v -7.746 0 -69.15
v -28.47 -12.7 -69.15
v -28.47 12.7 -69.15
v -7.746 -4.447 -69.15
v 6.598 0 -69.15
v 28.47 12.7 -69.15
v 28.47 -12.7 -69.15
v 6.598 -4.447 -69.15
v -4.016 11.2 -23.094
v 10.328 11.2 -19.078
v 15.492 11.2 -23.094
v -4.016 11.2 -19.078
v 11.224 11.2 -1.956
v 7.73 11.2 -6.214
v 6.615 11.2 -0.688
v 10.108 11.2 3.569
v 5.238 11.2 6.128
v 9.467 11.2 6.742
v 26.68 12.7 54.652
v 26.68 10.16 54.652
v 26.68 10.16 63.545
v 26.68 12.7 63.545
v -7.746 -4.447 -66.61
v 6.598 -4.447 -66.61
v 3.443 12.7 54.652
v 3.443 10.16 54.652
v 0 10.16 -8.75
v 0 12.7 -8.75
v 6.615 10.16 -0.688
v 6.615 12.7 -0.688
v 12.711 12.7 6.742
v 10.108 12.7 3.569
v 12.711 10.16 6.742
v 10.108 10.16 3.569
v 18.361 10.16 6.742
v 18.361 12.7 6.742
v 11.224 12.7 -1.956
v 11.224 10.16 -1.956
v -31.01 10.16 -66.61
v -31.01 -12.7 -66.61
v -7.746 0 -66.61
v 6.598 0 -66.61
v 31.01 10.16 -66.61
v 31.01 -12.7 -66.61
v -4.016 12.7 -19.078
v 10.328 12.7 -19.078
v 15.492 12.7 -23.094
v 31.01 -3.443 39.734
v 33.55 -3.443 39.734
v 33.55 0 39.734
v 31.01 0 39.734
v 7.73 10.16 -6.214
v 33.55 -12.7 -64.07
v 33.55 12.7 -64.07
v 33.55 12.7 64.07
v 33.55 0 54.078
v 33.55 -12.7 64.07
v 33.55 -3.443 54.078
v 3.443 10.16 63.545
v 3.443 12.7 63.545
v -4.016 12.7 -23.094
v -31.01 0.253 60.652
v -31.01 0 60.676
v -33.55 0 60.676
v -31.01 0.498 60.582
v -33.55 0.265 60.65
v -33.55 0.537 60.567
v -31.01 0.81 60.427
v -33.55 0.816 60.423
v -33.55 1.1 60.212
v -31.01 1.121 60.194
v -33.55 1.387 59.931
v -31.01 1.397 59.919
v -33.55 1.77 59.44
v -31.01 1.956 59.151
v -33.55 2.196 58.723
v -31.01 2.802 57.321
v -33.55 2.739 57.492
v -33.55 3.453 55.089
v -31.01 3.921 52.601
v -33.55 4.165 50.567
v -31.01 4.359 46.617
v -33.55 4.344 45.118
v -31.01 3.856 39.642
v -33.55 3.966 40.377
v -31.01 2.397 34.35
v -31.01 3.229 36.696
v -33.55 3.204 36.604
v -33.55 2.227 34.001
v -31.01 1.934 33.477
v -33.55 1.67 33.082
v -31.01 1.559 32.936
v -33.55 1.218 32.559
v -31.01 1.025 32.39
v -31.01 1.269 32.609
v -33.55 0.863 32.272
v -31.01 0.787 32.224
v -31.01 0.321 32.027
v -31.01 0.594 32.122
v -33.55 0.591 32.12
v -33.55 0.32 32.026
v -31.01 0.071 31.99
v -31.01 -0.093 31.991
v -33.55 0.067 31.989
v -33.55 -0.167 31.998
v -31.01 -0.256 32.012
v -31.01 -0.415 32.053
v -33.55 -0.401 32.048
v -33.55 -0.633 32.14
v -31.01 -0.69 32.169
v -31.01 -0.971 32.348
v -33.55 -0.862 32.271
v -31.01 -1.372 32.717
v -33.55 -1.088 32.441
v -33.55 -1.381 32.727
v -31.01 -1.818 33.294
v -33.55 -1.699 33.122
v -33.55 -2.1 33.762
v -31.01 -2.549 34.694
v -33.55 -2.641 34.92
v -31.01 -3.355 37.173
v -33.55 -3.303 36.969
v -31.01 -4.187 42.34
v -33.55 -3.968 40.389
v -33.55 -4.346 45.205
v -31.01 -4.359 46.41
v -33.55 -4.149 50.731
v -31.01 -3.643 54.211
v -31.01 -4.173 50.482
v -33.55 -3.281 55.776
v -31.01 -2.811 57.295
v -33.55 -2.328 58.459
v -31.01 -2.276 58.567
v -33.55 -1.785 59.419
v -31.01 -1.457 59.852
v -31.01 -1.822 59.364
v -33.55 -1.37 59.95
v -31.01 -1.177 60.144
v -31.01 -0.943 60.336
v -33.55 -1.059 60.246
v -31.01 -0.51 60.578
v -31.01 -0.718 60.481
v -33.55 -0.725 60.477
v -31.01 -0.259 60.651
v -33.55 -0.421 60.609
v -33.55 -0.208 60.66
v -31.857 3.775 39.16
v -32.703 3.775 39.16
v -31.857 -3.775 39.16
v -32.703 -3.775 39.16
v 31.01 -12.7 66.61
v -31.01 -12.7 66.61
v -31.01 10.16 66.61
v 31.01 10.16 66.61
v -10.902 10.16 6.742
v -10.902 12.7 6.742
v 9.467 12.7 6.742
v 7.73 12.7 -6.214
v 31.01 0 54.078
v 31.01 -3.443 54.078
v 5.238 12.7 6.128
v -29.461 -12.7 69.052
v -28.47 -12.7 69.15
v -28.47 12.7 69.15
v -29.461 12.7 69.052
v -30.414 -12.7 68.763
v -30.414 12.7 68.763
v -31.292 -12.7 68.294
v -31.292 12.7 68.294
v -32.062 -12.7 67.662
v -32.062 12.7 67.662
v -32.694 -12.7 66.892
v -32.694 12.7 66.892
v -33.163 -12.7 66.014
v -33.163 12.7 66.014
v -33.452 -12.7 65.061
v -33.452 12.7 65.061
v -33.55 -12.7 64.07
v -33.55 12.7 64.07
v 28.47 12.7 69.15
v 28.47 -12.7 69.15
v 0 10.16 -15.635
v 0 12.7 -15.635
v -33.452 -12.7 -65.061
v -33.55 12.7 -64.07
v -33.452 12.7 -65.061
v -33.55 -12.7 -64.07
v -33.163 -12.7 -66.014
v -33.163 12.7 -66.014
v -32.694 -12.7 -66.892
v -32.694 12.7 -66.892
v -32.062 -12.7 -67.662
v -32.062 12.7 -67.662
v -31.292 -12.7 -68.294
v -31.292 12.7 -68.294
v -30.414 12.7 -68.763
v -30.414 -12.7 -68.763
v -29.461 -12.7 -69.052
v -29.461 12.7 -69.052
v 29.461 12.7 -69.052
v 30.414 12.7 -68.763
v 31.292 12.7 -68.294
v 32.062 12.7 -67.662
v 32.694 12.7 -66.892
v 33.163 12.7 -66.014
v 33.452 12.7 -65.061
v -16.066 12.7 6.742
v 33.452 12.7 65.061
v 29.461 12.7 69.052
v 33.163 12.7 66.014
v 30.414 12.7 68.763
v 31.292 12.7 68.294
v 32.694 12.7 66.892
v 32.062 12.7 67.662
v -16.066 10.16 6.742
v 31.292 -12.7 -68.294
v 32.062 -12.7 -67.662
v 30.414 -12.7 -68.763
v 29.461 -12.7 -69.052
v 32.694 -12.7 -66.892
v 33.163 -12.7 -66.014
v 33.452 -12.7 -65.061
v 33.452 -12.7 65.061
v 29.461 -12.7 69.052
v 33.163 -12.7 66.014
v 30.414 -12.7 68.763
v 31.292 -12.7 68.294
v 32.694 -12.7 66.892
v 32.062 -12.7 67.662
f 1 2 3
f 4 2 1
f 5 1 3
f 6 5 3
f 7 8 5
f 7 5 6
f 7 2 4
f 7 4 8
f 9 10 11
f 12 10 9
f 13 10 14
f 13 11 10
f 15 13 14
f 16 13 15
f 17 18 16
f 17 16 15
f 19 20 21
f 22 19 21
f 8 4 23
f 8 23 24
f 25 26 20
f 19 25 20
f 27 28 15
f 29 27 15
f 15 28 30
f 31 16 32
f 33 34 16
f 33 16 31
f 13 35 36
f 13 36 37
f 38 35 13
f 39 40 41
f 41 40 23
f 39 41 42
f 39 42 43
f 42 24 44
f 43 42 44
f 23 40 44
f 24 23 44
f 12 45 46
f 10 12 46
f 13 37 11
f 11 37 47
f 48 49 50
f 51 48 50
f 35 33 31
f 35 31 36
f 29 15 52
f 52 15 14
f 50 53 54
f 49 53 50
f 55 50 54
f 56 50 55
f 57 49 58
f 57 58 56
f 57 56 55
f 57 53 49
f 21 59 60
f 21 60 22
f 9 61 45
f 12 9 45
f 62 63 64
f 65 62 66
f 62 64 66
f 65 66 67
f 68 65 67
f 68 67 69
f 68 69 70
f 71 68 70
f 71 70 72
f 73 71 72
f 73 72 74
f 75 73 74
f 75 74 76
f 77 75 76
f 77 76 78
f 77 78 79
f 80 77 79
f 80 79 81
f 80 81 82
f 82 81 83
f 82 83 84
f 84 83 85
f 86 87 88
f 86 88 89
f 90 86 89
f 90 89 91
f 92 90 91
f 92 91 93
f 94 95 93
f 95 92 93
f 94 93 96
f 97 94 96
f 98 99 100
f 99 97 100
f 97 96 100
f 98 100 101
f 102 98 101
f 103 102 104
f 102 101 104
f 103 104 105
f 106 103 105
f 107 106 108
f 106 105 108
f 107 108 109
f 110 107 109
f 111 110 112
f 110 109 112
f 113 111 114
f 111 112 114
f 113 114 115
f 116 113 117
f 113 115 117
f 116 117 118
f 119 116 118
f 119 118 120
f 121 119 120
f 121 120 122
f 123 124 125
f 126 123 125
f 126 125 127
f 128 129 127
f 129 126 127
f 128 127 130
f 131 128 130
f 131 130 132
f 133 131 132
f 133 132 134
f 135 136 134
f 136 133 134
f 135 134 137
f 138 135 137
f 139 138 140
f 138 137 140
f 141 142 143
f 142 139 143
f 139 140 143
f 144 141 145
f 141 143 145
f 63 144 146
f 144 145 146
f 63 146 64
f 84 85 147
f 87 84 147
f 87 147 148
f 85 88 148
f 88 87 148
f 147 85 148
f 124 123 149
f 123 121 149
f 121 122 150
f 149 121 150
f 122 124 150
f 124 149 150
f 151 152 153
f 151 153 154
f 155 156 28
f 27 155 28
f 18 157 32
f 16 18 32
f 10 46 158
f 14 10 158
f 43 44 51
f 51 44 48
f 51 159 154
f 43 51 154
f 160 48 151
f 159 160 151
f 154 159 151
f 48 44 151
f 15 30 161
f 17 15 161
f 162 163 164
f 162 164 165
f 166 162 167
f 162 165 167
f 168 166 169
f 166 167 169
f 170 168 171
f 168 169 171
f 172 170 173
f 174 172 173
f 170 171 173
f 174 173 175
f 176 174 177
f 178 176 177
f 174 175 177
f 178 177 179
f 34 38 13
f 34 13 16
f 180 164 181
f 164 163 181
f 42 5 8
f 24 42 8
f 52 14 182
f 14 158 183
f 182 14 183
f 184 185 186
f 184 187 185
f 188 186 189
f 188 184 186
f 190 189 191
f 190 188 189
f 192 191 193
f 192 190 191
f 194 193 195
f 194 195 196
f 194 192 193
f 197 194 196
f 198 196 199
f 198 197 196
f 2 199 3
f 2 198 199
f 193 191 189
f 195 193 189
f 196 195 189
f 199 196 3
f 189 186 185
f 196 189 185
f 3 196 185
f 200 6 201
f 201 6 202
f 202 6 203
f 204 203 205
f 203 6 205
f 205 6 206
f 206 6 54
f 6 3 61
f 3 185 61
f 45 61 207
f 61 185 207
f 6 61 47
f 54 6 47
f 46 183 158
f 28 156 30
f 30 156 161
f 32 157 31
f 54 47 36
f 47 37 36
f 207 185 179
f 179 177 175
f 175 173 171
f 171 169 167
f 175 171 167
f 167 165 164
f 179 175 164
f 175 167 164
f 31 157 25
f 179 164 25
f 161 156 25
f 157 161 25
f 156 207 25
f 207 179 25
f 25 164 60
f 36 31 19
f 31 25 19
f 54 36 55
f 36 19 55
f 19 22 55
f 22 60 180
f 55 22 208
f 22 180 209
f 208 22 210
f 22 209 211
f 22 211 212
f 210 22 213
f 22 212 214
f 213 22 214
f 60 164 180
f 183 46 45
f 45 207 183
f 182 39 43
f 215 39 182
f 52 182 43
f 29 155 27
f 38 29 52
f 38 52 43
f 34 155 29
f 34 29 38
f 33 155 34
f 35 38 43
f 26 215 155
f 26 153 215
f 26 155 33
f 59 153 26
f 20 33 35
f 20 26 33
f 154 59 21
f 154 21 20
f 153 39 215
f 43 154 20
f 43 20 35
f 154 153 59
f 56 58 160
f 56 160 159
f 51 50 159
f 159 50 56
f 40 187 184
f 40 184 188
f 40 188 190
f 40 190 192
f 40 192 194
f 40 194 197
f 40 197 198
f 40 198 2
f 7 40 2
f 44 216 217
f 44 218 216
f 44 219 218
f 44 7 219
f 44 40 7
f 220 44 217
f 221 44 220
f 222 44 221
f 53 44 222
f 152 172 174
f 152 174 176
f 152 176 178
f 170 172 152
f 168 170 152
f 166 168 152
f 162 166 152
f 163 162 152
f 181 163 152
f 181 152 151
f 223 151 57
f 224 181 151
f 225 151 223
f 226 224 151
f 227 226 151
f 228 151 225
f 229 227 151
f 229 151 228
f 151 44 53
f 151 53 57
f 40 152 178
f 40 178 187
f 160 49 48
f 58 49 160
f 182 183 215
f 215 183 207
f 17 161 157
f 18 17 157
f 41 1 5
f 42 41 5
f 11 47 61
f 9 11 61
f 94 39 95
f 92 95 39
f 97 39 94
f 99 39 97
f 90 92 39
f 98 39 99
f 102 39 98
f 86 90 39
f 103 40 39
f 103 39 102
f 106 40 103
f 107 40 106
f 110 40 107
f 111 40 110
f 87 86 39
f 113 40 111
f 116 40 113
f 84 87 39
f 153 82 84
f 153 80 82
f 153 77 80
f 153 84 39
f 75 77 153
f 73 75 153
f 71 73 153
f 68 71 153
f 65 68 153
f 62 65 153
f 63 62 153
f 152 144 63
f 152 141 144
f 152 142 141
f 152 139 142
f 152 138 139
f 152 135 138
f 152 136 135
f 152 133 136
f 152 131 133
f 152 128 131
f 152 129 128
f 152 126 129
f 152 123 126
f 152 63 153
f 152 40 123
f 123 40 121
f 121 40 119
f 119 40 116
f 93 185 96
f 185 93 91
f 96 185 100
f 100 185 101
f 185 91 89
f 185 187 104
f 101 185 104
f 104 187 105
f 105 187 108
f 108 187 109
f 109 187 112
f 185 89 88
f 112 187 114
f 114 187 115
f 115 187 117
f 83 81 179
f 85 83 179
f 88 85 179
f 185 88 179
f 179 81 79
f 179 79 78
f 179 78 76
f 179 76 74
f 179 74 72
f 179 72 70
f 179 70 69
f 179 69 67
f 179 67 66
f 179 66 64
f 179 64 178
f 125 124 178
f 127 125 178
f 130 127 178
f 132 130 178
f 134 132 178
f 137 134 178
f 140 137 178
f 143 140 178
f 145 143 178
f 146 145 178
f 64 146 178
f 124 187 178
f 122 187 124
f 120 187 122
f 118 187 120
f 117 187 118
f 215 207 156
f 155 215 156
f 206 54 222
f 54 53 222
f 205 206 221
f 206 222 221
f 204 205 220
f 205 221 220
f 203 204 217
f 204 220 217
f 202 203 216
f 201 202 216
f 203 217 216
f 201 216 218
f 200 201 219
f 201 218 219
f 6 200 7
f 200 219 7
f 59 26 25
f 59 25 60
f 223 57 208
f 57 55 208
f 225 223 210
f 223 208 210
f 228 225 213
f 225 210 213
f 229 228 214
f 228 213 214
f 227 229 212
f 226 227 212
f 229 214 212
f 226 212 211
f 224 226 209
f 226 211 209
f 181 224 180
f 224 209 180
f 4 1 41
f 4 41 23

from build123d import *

# Parameters (mm, degrees)
F0_W      = 67.1
F0_H      = 138.3
F1_DEPTH  = 12.7
F2_T      = -2.54
F3_R      = 5.08
F4_W      = 23.2377038337
F4_H      = 8.8934414089
F5_DEPTH  = 12.5
F6_W      = 14.3442638218
F6_H      = 4.4467216358
F7_DEPTH  = 35
F9_DEPTH  = 27.5
F10_W     = 3.4426231869
F10_H     = 14.3442638218
F11_DEPTH = 27.5
F13_DEPTH = 1.5
F15_DEPTH = 27.5


with BuildPart() as f1:
    # F0 (on Front) → F1 (new body, symmetric)
    with BuildSketch(Plane.XZ):
        Rectangle(F0_W, F0_H)
    extrude(amount=F1_DEPTH, both=True)

    # F2
    f2_openings = [f1.faces().sort_by_distance(p)[0] for p in [
        (0, -12.7, 0),
    ]]
    offset(amount=F2_T, openings=f2_openings)

    # F3
    f3_edges = [f1.edges().sort_by_distance(p)[0] for p in [
        (33.55, 0, 69.15),
        (33.55, 0, -69.15),
        (-33.55, 0, 69.15),
        (-33.55, 0, -69.15),
    ]]
    fillet(f3_edges, radius=F3_R)

    # F4 (on face) → F5 (cut, symmetric)
    with BuildSketch(Plane.XZ.offset(-10.16)):
        with Locations((15.061476035, 59.0983647853)):
            Rectangle(F4_W, F4_H)
    extrude(amount=F5_DEPTH, both=True, mode=Mode.SUBTRACT)

    # F6 (on face) → F7 (cut, symmetric)
    with BuildSketch(Plane(origin=(0, 0, -69.15), x_dir=(1, 0, 0), z_dir=(0, 0, -1))):
        with Locations((-0.5737706088, 2.2233608179)):
            Rectangle(F6_W, F6_H)
    extrude(amount=F7_DEPTH, both=True, mode=Mode.SUBTRACT)

    # F8 (on face) → F9 (cut, symmetric)
    with BuildSketch(Plane(origin=(-33.55, 0, 0), x_dir=(0, -1, 0), z_dir=(-1, 0, 0))):
        with BuildLine():
            add(Edge.make_bspline(
                [(0, 60.676228255), (-7.550774062, 60.676228255), (-3.775387031, 39.1598381102), (0, 17.6434479654), (3.775387031, 39.1598381102), (7.550774062, 60.676228255), (0, 60.676228255)],
                knots=[0, 0, 0, 2.0943951024, 2.0943951024, 4.1887902048, 4.1887902048, 6.2831853072, 6.2831853072, 6.2831853072], degree=2, weights=[1, 0.5, 1, 0.5, 1, 0.5, 1]))
        make_face()
    extrude(amount=F9_DEPTH, both=True, mode=Mode.SUBTRACT)

    # F10 (on face) → F11 (cut, symmetric)
    with BuildSketch(Plane.YZ.offset(33.55)):
        with Locations((-1.7213115934, 46.9057392329)):
            Rectangle(F10_W, F10_H)
    extrude(amount=F11_DEPTH, both=True, mode=Mode.SUBTRACT)

    # F12 (on face) → F13 (cut, symmetric)
    with BuildSketch(Plane(origin=(0, 12.7, 0), x_dir=(-1, 0, 0), z_dir=(0, 1, 0))):
        Polygon((-5.2382490833, 6.1278682367), (-9.4672134146, 6.7418036051), (-15.491804108, -23.0942647904), (4.0163947269, -23.0942647904), (4.0163947269, -19.0778691322), (-10.3278690949, -19.0778691322), align=None)
    extrude(amount=F13_DEPTH, both=True, mode=Mode.SUBTRACT)

    # F14 (on face) → F15 (cut, symmetric)
    with BuildSketch(Plane(origin=(0, 12.7, 0), x_dir=(-1, 0, 0), z_dir=(0, 1, 0))):
        Polygon((-12.711224328, 6.7418036051), (-18.3606576174, 6.7418036051), (-11.2235988457, -1.9564862073), (-10.1078801099, 3.5689780455), align=None)
        Polygon((-6.6146179771, -0.6884349019), (-7.730336713, -6.2138991547), (0, -15.635246411), (16.0655751824, 6.7418036051), (10.901639238, 6.7418036051), (0, -8.7500000373), align=None)
    extrude(amount=F15_DEPTH, both=True, mode=Mode.SUBTRACT)


solid = f1.part
